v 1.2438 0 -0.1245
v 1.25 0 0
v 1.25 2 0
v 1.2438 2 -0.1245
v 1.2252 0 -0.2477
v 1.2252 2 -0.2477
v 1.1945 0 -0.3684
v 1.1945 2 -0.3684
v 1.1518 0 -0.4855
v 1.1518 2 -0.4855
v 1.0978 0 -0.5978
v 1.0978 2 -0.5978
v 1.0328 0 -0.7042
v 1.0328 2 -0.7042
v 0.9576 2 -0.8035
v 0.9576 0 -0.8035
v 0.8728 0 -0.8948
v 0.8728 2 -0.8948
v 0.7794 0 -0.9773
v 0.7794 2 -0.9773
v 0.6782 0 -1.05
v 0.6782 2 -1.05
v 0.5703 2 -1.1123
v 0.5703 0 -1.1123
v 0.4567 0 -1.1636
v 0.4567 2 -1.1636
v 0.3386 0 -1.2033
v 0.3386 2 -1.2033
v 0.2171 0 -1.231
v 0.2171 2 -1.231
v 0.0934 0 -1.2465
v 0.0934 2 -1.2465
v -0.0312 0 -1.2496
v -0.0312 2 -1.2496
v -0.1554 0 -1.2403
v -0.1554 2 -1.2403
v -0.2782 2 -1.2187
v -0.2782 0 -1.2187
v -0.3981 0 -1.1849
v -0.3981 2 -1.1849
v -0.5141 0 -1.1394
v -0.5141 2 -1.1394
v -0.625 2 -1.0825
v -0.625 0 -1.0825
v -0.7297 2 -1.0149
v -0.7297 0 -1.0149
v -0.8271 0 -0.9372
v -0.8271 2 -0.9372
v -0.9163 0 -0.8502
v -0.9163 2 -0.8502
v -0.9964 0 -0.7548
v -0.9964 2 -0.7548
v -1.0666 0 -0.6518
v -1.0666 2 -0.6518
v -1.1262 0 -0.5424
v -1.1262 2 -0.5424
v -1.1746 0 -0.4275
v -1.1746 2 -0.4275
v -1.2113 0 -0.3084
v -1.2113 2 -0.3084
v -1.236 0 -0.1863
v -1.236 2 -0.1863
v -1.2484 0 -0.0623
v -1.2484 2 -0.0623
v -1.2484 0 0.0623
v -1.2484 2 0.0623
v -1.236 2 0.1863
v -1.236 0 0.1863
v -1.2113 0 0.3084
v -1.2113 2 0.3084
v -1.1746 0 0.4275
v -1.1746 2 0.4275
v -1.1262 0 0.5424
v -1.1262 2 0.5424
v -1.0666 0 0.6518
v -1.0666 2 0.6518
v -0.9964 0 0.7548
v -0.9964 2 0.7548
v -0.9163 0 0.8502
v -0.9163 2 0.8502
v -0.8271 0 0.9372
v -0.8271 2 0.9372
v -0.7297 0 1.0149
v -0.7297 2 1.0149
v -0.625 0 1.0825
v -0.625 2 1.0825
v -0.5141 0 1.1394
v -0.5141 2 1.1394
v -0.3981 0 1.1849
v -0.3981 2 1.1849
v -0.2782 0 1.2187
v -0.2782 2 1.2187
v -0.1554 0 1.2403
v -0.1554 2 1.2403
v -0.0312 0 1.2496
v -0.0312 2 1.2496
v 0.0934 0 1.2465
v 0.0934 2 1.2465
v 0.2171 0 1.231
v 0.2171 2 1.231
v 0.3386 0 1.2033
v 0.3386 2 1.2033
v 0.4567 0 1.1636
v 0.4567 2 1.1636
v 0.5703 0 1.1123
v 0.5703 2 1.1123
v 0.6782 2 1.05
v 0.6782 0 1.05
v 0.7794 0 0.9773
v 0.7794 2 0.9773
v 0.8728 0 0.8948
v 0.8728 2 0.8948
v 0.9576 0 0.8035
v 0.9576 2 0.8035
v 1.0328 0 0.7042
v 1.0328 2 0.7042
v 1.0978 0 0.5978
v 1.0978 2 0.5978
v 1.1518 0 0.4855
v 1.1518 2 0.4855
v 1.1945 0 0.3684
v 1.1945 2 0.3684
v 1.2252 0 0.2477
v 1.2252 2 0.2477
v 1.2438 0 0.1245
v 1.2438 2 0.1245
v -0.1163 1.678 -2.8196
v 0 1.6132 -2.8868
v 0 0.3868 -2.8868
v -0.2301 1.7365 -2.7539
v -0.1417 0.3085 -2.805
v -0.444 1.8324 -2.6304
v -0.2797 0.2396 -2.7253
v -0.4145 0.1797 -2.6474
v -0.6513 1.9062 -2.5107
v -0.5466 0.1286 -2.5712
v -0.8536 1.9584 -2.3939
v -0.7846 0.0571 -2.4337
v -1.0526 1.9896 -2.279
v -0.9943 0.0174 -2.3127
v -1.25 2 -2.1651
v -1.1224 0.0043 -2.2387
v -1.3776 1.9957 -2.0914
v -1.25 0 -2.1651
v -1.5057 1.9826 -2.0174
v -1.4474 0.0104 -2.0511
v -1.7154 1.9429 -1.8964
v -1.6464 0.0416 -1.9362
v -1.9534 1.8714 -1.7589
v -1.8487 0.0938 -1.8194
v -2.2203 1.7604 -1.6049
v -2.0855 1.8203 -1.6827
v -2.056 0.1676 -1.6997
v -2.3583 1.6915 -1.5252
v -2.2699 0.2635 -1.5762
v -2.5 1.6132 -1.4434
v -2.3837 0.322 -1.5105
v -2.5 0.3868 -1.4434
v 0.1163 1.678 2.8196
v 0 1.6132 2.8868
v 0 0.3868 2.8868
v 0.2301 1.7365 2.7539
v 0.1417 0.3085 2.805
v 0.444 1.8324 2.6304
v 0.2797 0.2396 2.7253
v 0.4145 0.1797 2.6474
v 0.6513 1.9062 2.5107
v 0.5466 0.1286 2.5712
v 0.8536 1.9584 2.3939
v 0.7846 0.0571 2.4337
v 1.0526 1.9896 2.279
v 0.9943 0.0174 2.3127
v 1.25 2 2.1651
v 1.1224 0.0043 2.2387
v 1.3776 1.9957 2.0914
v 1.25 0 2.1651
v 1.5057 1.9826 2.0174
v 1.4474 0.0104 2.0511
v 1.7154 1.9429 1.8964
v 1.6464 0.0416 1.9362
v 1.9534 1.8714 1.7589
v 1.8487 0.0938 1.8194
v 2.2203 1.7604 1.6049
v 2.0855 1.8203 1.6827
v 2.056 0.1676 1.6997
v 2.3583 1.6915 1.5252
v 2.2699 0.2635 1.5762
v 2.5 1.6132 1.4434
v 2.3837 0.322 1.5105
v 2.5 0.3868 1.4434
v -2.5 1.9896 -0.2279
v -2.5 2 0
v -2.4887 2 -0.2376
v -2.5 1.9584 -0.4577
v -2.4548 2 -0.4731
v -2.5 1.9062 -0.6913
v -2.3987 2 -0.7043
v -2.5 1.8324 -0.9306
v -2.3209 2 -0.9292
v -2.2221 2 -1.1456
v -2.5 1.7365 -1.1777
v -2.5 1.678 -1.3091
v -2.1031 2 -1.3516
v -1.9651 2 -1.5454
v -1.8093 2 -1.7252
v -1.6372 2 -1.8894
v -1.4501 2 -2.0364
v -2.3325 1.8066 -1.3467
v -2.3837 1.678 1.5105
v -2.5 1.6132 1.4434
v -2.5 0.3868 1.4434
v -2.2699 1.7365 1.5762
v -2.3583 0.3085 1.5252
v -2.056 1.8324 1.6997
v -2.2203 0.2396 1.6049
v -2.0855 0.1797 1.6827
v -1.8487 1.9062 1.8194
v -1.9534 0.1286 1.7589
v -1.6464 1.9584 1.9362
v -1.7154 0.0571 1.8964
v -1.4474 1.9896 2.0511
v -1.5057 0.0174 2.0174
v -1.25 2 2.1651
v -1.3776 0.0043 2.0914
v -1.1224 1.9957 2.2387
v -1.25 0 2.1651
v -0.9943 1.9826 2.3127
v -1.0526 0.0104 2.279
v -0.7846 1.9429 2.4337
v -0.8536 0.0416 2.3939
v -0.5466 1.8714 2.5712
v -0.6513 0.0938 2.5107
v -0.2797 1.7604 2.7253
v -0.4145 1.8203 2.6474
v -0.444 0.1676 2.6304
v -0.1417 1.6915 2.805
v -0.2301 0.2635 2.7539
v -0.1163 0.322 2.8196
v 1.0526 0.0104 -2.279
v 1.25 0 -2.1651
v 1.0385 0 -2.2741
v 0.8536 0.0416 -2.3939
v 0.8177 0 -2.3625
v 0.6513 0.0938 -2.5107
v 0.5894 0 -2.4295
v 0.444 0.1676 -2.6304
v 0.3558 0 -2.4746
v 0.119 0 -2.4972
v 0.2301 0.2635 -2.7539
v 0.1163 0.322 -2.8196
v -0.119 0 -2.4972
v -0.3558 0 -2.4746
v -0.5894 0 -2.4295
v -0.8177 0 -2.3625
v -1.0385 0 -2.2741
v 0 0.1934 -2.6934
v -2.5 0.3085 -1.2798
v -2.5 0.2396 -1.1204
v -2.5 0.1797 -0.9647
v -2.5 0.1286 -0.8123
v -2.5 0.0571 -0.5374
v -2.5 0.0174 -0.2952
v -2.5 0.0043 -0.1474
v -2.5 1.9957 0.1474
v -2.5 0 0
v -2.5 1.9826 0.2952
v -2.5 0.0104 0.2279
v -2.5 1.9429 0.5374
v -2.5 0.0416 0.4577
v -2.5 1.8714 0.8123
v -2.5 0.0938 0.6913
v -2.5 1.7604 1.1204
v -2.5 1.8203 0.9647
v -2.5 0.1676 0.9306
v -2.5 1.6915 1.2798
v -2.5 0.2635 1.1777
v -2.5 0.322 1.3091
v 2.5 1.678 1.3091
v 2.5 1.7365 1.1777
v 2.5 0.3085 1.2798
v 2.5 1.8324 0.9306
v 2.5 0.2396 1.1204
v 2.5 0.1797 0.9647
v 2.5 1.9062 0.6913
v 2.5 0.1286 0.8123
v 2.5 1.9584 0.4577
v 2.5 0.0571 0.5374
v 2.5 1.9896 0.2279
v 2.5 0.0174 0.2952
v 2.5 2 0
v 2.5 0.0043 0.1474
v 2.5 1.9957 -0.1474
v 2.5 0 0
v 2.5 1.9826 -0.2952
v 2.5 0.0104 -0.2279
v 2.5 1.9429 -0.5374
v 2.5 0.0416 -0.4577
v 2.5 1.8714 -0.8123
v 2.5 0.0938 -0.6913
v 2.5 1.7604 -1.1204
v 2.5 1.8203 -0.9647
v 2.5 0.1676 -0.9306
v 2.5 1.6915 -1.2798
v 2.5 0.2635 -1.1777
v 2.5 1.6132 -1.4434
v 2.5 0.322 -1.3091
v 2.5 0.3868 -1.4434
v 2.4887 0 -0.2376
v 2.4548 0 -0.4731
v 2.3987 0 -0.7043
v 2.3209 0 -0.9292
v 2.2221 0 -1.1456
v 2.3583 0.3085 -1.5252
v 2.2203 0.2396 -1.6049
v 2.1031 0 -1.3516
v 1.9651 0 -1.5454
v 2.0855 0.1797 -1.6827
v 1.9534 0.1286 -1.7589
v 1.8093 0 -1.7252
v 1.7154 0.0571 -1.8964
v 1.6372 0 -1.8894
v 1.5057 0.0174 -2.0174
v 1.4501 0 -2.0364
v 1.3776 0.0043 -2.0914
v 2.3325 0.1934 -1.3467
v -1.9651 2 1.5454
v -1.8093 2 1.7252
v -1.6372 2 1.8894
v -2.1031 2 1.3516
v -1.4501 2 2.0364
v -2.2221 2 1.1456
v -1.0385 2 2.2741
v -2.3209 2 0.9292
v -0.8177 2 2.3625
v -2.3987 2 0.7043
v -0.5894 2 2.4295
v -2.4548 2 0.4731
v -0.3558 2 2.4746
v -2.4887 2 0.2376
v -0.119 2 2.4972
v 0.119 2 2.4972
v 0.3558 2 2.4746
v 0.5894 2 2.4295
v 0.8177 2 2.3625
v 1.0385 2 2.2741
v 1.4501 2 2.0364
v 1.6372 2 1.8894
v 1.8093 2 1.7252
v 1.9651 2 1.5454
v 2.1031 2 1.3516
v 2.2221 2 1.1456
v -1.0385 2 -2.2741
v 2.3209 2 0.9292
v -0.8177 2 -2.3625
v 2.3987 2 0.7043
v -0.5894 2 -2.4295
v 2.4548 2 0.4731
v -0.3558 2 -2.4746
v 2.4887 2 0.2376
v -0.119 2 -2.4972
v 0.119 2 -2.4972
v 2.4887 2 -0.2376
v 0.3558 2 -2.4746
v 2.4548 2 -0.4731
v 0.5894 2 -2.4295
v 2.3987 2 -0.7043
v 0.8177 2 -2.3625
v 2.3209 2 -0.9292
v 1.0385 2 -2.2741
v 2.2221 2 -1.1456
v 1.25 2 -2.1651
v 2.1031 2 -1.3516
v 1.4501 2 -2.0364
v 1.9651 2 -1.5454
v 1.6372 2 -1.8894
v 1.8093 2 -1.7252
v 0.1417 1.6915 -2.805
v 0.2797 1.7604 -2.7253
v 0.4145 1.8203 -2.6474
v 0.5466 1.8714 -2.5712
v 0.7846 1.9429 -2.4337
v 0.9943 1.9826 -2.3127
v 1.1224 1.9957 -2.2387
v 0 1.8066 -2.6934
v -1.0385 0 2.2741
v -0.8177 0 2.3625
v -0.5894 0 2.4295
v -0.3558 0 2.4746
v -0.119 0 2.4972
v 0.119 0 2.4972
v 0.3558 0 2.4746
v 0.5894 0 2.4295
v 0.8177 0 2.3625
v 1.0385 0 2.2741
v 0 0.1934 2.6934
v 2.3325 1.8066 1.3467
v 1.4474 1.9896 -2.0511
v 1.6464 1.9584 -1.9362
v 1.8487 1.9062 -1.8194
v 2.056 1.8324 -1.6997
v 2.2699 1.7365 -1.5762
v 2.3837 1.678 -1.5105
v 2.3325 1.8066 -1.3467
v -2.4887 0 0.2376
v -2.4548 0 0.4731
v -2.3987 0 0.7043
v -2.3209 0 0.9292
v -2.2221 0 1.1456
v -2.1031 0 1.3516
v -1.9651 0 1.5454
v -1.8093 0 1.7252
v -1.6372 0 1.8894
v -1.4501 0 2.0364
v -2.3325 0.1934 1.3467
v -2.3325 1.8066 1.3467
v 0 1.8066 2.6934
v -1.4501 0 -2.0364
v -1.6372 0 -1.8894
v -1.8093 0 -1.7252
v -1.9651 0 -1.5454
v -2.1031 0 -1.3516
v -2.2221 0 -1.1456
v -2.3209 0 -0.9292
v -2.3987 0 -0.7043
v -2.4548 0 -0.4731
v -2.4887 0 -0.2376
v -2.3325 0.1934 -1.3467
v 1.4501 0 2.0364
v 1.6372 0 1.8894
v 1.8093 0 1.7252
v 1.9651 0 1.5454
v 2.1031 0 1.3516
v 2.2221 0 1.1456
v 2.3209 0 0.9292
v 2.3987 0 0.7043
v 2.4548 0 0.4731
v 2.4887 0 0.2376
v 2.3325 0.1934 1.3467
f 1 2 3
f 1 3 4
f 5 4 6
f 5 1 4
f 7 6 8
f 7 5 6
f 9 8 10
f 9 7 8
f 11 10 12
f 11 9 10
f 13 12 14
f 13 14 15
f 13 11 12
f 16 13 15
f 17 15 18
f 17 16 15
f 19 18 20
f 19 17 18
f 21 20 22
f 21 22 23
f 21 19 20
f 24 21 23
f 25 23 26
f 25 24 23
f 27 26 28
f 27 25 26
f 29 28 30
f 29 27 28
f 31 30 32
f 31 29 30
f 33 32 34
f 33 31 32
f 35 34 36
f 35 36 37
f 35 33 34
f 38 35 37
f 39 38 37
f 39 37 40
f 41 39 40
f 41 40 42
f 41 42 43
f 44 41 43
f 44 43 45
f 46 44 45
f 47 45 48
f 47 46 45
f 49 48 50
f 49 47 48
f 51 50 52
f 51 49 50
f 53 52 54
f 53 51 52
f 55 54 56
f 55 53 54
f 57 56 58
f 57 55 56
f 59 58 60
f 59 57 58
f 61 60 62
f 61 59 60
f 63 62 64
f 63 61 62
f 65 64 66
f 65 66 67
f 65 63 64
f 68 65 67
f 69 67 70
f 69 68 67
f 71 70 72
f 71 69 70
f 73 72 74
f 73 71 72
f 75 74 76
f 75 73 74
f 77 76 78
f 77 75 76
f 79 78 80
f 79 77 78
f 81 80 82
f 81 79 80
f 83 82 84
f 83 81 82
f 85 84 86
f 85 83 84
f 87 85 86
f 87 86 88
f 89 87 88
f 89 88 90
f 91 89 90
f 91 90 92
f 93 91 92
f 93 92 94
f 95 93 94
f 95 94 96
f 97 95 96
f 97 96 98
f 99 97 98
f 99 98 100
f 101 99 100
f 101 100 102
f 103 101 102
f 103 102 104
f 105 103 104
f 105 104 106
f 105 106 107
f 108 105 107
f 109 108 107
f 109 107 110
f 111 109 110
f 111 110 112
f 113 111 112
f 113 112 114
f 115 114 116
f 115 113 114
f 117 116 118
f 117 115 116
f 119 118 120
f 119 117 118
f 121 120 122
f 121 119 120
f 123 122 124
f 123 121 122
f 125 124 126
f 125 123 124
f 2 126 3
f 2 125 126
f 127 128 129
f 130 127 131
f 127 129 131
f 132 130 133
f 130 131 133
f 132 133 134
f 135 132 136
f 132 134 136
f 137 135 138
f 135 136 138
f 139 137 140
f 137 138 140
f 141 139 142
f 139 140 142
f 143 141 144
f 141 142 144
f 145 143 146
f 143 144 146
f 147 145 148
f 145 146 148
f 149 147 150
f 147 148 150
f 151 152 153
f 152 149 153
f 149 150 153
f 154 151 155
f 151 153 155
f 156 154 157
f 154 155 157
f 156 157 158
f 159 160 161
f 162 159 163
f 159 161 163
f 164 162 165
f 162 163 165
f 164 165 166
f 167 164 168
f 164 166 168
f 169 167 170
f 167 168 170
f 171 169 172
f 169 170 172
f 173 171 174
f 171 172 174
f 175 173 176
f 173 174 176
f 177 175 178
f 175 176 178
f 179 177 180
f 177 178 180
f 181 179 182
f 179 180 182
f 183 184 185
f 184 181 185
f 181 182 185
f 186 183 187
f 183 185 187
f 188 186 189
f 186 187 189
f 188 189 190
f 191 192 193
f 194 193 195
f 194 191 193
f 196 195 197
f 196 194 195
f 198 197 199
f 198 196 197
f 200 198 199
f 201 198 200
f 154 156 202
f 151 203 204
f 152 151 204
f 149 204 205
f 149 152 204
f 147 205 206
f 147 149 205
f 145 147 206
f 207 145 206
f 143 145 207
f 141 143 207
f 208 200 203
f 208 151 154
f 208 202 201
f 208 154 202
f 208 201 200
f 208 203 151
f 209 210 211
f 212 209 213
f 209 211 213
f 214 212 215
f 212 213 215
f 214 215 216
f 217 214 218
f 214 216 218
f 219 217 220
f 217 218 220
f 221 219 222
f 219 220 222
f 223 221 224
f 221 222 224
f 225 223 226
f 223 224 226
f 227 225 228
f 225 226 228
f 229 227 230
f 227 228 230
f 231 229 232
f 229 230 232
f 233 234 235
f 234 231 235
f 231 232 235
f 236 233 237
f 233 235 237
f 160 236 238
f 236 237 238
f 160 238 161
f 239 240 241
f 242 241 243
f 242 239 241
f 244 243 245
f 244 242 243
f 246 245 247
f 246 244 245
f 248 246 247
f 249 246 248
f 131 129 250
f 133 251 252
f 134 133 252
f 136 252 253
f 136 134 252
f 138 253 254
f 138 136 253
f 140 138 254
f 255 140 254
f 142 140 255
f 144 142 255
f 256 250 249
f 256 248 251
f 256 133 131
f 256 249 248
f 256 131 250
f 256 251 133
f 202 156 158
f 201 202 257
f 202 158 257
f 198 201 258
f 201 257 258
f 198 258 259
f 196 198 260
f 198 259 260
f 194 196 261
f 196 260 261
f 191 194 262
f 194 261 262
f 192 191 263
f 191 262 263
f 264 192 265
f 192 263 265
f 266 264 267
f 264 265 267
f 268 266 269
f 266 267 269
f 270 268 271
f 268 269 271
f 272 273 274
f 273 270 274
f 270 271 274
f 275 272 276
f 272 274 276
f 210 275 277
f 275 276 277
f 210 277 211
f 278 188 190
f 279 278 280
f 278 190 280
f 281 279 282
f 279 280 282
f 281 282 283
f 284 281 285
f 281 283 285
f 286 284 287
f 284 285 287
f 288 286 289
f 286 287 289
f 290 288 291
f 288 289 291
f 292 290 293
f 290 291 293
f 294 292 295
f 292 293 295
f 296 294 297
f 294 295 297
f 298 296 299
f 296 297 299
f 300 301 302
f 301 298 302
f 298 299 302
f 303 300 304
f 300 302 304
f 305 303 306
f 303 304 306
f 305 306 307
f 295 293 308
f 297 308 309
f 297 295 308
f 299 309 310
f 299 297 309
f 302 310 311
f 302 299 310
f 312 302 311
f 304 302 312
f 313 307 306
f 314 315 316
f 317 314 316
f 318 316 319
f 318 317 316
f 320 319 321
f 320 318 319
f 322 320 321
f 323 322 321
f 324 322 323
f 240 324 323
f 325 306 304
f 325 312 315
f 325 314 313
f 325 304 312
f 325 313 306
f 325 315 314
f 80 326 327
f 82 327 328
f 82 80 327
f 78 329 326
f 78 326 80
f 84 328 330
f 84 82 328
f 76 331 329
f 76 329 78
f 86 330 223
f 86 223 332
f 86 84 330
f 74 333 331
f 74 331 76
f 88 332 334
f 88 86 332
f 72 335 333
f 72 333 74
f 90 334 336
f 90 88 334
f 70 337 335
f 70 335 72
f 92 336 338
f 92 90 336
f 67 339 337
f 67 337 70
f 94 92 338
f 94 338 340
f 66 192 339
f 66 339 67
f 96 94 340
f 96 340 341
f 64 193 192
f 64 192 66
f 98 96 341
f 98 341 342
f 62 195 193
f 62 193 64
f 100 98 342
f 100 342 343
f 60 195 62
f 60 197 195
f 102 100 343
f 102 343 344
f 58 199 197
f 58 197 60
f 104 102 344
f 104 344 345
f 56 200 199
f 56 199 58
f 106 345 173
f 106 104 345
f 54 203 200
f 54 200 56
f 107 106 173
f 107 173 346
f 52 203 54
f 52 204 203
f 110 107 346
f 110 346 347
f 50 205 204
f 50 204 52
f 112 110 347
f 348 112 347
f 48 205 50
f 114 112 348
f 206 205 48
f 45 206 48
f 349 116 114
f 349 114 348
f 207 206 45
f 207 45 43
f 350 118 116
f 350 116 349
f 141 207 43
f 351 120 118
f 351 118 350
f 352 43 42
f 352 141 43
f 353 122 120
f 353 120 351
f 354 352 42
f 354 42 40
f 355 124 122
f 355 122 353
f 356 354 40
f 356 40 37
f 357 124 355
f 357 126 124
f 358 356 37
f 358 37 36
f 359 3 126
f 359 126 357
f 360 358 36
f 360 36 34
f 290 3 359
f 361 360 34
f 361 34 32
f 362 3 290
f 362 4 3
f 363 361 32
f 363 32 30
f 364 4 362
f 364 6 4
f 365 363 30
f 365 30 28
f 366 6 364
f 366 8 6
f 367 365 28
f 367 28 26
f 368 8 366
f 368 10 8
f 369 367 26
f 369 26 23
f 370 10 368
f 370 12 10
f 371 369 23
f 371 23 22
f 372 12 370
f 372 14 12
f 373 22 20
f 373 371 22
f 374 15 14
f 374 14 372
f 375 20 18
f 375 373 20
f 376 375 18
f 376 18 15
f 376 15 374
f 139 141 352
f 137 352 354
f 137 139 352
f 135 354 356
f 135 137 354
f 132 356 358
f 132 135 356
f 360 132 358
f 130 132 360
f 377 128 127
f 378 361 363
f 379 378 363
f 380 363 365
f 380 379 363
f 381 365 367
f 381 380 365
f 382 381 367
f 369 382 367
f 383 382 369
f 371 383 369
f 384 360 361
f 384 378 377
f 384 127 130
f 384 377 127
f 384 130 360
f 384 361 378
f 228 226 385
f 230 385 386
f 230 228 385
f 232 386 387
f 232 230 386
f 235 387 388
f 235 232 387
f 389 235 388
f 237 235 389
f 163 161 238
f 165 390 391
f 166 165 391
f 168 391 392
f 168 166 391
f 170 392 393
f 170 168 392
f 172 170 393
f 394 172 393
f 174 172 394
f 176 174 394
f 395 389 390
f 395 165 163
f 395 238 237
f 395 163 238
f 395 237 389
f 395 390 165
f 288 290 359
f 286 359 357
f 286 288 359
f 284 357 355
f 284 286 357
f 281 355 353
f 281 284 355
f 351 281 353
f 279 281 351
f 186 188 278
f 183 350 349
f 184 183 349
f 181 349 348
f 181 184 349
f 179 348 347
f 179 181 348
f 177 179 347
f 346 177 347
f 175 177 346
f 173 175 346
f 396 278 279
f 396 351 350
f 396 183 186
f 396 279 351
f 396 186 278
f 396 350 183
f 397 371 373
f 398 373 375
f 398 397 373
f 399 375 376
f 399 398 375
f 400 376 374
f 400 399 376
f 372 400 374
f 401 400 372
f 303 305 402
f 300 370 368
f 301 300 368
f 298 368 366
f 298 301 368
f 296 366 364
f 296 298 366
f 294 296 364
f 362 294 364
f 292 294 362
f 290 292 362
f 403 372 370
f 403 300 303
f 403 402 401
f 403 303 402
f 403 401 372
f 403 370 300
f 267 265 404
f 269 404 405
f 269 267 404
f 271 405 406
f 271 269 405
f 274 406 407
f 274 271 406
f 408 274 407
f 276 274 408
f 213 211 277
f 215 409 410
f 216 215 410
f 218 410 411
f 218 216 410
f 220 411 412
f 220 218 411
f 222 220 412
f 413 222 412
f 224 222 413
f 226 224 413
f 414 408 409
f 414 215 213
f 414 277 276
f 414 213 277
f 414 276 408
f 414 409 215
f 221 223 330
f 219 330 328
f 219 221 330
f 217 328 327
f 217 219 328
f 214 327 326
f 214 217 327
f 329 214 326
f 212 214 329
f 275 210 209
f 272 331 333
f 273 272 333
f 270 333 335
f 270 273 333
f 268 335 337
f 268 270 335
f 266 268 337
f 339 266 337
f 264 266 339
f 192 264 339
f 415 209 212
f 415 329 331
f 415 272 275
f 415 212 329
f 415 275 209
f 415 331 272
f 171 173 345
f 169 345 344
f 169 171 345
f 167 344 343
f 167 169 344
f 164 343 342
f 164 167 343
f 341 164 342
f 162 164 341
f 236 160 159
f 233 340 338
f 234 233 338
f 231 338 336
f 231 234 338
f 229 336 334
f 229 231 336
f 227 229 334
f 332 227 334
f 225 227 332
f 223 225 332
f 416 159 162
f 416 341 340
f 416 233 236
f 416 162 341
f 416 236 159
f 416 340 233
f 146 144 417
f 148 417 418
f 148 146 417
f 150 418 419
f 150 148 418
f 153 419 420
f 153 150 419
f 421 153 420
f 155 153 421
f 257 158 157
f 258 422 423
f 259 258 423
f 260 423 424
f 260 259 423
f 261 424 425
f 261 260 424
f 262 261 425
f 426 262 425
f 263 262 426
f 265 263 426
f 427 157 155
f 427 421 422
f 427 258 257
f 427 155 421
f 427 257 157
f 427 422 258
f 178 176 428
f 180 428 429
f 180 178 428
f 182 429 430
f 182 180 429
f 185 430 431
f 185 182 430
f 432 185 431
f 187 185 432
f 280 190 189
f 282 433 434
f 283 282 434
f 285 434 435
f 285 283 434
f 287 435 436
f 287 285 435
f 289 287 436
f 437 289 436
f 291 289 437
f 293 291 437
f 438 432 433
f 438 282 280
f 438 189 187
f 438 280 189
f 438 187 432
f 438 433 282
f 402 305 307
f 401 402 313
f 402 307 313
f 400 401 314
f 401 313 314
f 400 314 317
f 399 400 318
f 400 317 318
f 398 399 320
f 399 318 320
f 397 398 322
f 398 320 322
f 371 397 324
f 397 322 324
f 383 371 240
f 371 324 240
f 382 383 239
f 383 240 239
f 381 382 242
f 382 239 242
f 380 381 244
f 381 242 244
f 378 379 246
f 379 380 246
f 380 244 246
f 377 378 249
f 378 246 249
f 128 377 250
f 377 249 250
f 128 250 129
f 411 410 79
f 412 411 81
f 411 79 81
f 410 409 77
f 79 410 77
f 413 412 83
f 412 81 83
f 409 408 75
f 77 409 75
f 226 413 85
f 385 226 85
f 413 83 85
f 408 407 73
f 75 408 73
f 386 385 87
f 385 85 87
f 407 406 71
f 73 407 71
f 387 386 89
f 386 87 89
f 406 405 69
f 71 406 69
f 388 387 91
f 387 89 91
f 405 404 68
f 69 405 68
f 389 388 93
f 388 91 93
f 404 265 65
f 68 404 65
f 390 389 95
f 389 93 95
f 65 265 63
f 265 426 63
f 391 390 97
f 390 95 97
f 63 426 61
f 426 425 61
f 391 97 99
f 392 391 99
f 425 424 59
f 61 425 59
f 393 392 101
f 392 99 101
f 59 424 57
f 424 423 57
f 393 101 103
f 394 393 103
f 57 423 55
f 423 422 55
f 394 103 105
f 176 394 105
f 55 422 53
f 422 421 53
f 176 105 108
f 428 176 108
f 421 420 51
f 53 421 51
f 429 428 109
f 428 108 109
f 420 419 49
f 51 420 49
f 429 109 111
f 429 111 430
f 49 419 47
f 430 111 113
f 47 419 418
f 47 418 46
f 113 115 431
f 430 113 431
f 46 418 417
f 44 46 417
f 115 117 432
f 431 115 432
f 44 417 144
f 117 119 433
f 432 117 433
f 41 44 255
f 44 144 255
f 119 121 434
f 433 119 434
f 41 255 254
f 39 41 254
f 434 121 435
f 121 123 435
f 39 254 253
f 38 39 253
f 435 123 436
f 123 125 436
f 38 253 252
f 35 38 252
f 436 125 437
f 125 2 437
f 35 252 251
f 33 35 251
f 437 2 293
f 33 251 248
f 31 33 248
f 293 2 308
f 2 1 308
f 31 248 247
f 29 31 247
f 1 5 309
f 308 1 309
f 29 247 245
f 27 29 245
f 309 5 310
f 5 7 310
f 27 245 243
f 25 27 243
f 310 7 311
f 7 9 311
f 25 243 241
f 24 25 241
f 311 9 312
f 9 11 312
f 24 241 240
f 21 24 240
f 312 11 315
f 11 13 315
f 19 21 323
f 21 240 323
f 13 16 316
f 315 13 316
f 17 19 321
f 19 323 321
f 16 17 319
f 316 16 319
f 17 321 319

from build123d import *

# Parameters (mm, degrees)
SKETCH1_R           = 1.25
BOSS_EXTRUDE1_DEPTH = 2
SKETCH2_OUTSIDE_W   = 14.58
SKETCH2_OUTSIDE_H   = 15.354
SKETCH2_OUTSIDE_R   = 2.5
CUT_EXTRUDE1_DEPTH  = 3
CUT_EXTRUDE1_TAPER  = 45
SKETCH3_OUTSIDE_W   = 14.58
SKETCH3_OUTSIDE_H   = 15.354
SKETCH3_OUTSIDE_R   = 2.5
CUT_EXTRUDE2_DEPTH  = 3
CUT_EXTRUDE2_TAPER  = 45


with BuildPart() as part:
    # Sketch1 → Boss-Extrude1 (new body)
    with BuildSketch(Plane(origin=(0, 0, 0), x_dir=(1, 0, 0), z_dir=(0, 1, 0))):
        Polygon((0, 2.886751346), (-2.5, 1.443375673), (-2.5, -1.443375673), (0, -2.886751346), (2.5, -1.443375673), (2.5, 1.443375673), align=None)
        Circle(SKETCH1_R, mode=Mode.SUBTRACT)
    extrude(amount=BOSS_EXTRUDE1_DEPTH)

    # Sketch2 outside → Cut-Extrude1 (cut, through all)
    with BuildSketch(Plane(origin=(0, 2, 0), x_dir=(1, 0, 0), z_dir=(0, 1, 0))):
        Rectangle(SKETCH2_OUTSIDE_W, SKETCH2_OUTSIDE_H)
        Circle(SKETCH2_OUTSIDE_R, mode=Mode.SUBTRACT)
    extrude(amount=-CUT_EXTRUDE1_DEPTH, taper=CUT_EXTRUDE1_TAPER, mode=Mode.SUBTRACT)

    # Sketch3 outside → Cut-Extrude2 (cut, through all)
    with BuildSketch(Plane.XZ):
        Rectangle(SKETCH3_OUTSIDE_W, SKETCH3_OUTSIDE_H)
        Circle(SKETCH3_OUTSIDE_R, mode=Mode.SUBTRACT)
    extrude(amount=-CUT_EXTRUDE2_DEPTH, taper=CUT_EXTRUDE2_TAPER, mode=Mode.SUBTRACT)


solid = part.part
